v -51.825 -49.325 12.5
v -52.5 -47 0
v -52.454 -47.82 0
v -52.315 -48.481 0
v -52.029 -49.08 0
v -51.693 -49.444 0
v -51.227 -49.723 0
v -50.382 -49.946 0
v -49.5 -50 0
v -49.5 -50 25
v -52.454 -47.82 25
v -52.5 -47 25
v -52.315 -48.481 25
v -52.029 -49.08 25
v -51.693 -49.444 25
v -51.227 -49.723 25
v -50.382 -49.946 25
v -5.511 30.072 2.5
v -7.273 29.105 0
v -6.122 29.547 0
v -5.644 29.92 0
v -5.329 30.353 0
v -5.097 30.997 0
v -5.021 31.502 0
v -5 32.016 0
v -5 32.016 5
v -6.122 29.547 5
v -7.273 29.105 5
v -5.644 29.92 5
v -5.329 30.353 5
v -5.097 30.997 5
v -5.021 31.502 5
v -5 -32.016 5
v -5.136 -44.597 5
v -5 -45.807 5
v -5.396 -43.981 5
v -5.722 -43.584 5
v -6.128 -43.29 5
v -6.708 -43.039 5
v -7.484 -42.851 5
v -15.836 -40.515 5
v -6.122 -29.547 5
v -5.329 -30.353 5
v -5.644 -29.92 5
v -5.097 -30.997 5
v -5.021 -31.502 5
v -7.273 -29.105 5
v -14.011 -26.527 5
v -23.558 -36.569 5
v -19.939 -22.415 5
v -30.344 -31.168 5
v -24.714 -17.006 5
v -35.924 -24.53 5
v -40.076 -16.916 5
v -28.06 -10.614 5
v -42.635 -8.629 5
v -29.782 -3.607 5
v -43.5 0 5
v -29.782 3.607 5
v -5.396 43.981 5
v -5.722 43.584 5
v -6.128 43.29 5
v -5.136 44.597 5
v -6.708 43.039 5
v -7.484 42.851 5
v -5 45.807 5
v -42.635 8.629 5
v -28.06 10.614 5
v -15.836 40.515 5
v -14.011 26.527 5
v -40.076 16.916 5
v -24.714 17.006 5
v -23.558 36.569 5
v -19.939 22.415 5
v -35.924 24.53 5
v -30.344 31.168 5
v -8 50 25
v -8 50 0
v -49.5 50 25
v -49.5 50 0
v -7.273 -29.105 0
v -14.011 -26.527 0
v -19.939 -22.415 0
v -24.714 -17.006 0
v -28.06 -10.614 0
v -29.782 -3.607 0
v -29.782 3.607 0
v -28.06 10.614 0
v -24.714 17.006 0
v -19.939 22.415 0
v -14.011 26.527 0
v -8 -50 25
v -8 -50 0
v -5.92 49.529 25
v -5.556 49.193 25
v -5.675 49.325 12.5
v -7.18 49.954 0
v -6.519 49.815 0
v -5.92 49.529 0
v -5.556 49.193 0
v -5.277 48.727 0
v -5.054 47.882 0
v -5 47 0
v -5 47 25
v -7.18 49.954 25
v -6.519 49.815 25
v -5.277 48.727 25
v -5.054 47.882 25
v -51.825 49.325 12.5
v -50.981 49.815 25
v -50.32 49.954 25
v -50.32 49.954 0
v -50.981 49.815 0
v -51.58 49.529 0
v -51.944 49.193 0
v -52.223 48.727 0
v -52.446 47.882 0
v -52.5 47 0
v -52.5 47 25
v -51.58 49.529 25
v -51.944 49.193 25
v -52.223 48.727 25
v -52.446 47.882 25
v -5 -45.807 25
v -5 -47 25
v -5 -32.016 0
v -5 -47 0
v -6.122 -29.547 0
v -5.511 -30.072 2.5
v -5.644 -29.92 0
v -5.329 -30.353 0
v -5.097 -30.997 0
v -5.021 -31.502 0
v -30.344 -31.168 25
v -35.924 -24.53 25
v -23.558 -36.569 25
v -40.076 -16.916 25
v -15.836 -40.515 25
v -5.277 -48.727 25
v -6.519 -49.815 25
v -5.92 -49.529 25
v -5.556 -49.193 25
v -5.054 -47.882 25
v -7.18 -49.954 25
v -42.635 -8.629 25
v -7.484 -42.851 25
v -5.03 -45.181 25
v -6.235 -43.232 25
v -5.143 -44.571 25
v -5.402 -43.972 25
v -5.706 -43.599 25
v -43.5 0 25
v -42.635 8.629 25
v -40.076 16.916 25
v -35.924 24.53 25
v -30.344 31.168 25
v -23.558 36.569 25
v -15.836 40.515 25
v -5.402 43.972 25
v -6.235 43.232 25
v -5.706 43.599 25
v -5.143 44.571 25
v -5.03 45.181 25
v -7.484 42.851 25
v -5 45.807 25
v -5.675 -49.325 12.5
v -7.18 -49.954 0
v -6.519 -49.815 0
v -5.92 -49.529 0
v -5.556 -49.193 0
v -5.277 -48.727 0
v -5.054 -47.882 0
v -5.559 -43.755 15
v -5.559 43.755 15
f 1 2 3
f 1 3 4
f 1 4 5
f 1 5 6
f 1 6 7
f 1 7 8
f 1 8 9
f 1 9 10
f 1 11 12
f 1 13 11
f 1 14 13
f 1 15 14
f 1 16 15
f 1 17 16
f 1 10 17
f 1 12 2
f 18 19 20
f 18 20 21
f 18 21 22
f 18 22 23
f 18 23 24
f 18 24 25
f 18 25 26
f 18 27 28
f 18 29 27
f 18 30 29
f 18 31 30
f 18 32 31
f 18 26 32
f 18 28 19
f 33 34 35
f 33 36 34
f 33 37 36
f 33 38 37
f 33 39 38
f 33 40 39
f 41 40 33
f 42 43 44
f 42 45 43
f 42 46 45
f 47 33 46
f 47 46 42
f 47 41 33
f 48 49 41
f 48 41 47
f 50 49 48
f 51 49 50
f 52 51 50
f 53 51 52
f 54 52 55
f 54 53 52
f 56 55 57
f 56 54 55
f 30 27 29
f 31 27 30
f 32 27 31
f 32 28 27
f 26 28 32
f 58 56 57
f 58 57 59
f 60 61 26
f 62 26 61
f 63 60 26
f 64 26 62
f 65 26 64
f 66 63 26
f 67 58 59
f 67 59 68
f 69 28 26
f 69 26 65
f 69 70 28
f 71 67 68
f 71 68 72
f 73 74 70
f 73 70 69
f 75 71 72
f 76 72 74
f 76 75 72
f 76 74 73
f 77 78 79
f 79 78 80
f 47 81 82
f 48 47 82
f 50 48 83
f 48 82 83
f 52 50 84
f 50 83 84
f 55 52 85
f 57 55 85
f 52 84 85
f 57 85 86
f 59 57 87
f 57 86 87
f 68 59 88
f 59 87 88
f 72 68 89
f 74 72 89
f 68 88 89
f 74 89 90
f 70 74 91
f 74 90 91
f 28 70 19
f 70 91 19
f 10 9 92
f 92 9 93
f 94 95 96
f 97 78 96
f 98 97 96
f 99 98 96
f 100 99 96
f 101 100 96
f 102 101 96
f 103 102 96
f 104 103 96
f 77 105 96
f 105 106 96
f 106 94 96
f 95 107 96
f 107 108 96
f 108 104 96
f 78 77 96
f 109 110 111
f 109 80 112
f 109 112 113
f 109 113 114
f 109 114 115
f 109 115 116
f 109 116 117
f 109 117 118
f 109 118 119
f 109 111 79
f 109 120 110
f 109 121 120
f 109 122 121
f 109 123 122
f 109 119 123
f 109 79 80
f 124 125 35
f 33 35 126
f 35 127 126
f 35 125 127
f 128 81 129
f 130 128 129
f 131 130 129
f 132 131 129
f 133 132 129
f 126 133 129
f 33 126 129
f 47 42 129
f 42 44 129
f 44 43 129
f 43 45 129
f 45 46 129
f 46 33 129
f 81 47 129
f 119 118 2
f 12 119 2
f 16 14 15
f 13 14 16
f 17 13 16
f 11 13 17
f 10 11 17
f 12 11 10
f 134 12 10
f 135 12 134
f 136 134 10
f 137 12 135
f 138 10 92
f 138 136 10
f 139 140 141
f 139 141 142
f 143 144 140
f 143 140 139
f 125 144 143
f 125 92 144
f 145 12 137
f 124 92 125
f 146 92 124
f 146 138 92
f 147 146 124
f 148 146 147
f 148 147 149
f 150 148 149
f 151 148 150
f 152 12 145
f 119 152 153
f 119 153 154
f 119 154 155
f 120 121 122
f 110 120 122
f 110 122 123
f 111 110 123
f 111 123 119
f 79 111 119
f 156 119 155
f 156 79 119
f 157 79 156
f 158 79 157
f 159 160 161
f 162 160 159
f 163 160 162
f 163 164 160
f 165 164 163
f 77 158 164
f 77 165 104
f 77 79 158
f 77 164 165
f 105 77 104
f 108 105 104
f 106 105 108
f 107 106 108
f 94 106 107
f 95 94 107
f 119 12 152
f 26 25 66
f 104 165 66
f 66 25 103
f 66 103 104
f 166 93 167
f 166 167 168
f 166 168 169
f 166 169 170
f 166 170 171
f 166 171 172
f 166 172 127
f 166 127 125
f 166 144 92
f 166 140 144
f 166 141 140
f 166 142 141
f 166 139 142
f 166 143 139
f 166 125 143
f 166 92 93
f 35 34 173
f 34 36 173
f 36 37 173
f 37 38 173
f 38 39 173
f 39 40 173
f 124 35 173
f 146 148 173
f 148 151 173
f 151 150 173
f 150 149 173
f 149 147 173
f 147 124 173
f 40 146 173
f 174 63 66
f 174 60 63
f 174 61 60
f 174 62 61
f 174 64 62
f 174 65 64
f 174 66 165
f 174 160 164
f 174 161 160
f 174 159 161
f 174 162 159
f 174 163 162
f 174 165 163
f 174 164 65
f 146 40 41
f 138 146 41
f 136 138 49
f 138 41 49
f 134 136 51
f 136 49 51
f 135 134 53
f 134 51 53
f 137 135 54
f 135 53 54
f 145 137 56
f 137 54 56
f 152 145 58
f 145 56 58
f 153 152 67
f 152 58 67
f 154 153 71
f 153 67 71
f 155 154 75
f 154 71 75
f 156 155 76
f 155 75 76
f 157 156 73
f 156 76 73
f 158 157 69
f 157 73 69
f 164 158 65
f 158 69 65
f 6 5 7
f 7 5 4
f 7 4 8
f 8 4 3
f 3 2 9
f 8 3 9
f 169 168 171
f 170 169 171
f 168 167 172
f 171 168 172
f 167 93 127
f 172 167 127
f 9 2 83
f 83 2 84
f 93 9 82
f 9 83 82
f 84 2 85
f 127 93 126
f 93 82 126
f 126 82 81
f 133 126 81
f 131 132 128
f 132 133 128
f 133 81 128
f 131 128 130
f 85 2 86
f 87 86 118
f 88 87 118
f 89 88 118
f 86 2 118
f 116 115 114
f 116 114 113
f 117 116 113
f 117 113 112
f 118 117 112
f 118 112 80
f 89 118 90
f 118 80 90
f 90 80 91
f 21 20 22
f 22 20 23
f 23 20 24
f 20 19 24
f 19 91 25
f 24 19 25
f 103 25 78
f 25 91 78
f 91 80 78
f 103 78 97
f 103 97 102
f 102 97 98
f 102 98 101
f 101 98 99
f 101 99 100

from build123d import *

# Parameters (mm, degrees)
BOSS_EXTRUDE1_DEPTH = 25
BOSS_EXTRUDE2_DEPTH = 5
FILLET1_SIZE        = 3


with BuildPart() as part:
    # Sketch1 → Boss-Extrude1 (new body)
    with BuildSketch(Plane.XY):
        with BuildLine():
            Line((-5, 50), (-52.5, 50))
            Line((-52.5, 50), (-52.5, -50))
            Line((-52.5, -50), (-5, -50))
            Line((-5, -50), (-5, -43.211688234))
            ThreePointArc((-5, -43.211688234), (-43.5, 0), (-5, 43.211688234))
            Line((-5, 43.211688234), (-5, 50))
        make_face()
    extrude(amount=BOSS_EXTRUDE1_DEPTH)

    # Sketch1<3> → Boss-Extrude2 (add)
    with BuildSketch(Plane.XY):
        with BuildLine():
            Line((-5, 29.580398915), (-5, 43.211688234))
            ThreePointArc((-5, 43.211688234), (-43.5, 0), (-5, -43.211688234))
            Line((-5, -43.211688234), (-5, -29.580398915))
            ThreePointArc((-5, -29.580398915), (-30, 0), (-5, 29.580398915))
        make_face()
    extrude(amount=BOSS_EXTRUDE2_DEPTH)

    # Fillet1
    # a fillet whose section is not a circle: 3 mm, written as the material it takes off along each edge
    with BuildSketch(Plane(origin=(-52.5, -50, -7.5), x_dir=(1, 0, 0), z_dir=(0, 0, 1)), Plane(origin=(-52.5, 50, -7.5), x_dir=(0, -1, 0), z_dir=(0, 0, 1)), Plane(origin=(-5, -50, -7.5), x_dir=(0, 1, 0), z_dir=(0, 0, 1))) as fillet1_piece_1:
        with BuildLine():
            Bezier((FILLET1_SIZE, 0), (0, 0), (0, FILLET1_SIZE), weights=[1, 1.222222222, 1])
            Line((0, FILLET1_SIZE), (0, 0))
            Line((0, 0), (FILLET1_SIZE, 0))
        make_face()
    extrude(amount=40, mode=Mode.SUBTRACT)
    with BuildSketch(Plane(origin=(-5, 50, -7.5), x_dir=(0, -1, 0), z_dir=(0, 0, 1))) as fillet1_piece_2:
        with BuildLine():
            Bezier((FILLET1_SIZE, 0), (0, 0), (0, -FILLET1_SIZE), weights=[1, 1.222222222, 1])
            Line((0, -FILLET1_SIZE), (0, 0))
            Line((0, 0), (FILLET1_SIZE, 0))
        make_face()
    extrude(amount=40, mode=Mode.SUBTRACT)
    with BuildSketch(Plane(origin=(-5, 43.211688234, 5), x_dir=(0, 1, 0), z_dir=(0, 0, 1))) as fillet1_piece_3:
        with BuildLine():
            Bezier((2.594970671, 0), (0.073503208, 0), (-0.360297645, 2.483870968), weights=[1, 1.222222222, 1])
            ThreePointArc((-0.360297645, 2.483870968), (-0.162230771, 1.244534585), (0, 0))
            Line((0, 0), (2.594970671, 0))
        make_face()
    extrude(amount=26.487426677, mode=Mode.SUBTRACT)
    with BuildSketch(Plane(origin=(-5, -43.211688234, 5), x_dir=(0, -1, 0), z_dir=(0, 0, 1))) as fillet1_piece_4:
        with BuildLine():
            Bezier((2.594970671, 0), (0.073503208, 0), (-0.360297645, -2.483870968), weights=[1, 1.222222222, 1])
            ThreePointArc((-0.360297645, -2.483870968), (-0.162230771, -1.244534585), (0, 0))
            Line((0, 0), (2.594970671, 0))
        make_face()
    extrude(amount=26.487426677, mode=Mode.SUBTRACT)
    with BuildSketch(Plane(origin=(-5, 29.580398915, -6.088055679), x_dir=(0, 1, 0), z_dir=(0, 0, 1))) as fillet1_piece_5:
        with BuildLine():
            Bezier((2.435222272, 0), (0.092615843, 0), (-0.475288745, 2.272727273), weights=[1, 1.222222222, 1])
            ThreePointArc((-0.475288745, 2.272727273), (-0.215648508, 1.140963567), (0, 0))
            Line((0, 0), (2.435222272, 0))
        make_face()
    extrude(amount=17.176111358, mode=Mode.SUBTRACT)
    with BuildSketch(Plane(origin=(-5, -29.580398915, -6.088055679), x_dir=(0, -1, 0), z_dir=(0, 0, 1))) as fillet1_piece_6:
        with BuildLine():
            Bezier((2.435222272, 0), (0.092615843, 0), (-0.475288745, -2.272727273), weights=[1, 1.222222222, 1])
            ThreePointArc((-0.475288745, -2.272727273), (-0.215648508, -1.140963567), (0, 0))
            Line((0, 0), (2.435222272, 0))
        make_face()
    extrude(amount=17.176111358, mode=Mode.SUBTRACT)


solid = part.part
